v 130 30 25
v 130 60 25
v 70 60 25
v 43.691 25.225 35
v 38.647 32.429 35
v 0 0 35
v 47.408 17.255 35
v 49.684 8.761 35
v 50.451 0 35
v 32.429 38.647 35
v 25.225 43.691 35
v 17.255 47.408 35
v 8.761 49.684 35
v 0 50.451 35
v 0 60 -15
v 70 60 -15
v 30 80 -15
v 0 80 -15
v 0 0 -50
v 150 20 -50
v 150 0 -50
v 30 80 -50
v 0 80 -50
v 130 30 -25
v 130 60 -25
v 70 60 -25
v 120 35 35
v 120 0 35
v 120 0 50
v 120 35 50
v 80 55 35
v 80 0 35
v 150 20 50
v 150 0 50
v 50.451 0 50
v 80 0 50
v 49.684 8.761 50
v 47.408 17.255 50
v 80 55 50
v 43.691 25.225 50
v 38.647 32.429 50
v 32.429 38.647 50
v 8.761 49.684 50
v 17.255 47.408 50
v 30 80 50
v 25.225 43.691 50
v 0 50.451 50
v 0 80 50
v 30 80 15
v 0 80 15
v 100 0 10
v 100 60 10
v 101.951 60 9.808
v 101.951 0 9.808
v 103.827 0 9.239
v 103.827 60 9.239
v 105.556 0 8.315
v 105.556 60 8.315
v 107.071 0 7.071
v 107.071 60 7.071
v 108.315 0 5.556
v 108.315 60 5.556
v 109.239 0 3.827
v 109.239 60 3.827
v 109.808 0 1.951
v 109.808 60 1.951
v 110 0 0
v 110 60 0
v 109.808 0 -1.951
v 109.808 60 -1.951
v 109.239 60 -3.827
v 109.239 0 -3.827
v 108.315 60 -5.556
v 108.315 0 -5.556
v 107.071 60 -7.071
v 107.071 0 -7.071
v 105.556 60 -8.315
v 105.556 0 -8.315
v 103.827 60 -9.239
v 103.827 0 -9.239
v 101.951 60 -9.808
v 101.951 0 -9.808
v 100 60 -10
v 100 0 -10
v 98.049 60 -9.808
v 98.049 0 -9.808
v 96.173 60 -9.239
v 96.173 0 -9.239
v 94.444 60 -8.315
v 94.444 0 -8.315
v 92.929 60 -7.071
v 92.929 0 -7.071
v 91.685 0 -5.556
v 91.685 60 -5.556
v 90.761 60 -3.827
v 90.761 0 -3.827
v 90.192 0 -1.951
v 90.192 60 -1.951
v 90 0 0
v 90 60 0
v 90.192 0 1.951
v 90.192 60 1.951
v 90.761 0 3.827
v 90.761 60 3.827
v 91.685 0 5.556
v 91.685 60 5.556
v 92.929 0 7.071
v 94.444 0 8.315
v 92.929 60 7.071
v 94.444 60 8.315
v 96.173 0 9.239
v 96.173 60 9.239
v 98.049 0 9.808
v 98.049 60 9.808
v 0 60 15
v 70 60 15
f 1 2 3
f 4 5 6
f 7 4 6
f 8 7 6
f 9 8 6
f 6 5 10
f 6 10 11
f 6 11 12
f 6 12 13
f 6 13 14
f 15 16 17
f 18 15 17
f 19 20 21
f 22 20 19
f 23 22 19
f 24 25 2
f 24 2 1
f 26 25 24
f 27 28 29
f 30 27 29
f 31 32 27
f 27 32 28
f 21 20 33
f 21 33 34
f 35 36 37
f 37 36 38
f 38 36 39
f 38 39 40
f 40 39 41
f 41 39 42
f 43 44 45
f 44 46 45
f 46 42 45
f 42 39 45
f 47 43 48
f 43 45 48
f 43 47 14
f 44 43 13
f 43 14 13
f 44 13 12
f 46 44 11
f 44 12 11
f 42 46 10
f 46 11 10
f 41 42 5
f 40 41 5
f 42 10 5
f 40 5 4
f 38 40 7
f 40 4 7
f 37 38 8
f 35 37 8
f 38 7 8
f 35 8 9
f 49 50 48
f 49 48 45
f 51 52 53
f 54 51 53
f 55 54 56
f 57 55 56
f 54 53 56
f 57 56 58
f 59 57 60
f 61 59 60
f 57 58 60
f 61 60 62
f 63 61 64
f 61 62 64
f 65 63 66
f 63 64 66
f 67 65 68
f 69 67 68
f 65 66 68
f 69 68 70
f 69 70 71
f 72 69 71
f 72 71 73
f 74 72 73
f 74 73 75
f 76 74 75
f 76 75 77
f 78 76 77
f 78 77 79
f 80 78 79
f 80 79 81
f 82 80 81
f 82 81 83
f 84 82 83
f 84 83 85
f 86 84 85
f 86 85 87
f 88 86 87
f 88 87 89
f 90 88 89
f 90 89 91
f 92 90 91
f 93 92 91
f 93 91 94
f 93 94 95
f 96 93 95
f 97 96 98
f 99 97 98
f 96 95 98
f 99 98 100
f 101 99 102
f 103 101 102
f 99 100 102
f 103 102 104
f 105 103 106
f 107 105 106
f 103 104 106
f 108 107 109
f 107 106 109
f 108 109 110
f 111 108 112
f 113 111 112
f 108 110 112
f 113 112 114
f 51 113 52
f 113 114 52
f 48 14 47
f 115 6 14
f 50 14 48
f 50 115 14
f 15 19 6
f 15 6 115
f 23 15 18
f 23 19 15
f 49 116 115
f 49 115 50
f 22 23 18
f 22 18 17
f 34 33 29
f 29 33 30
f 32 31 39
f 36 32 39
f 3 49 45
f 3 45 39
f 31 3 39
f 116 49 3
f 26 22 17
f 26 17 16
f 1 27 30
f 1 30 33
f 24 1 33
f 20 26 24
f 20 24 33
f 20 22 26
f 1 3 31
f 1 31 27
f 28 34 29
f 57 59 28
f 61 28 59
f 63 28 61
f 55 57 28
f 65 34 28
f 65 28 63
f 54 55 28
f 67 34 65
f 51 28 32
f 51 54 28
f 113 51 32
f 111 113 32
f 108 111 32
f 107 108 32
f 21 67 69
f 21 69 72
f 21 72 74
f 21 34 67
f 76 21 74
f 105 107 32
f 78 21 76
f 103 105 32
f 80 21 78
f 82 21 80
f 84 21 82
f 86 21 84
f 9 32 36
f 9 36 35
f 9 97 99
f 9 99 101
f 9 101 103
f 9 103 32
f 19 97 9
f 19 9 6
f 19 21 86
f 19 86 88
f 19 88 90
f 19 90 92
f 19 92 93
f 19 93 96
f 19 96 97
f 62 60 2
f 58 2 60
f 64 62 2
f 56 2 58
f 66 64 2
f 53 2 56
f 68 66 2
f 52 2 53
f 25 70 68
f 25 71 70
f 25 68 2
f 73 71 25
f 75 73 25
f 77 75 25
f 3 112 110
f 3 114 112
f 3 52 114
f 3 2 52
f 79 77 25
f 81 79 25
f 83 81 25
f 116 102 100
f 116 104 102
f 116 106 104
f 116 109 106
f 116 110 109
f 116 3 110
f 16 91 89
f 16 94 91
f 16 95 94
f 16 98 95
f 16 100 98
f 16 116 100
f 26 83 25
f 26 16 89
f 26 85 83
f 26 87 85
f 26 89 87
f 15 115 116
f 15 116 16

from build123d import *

# Parameters (mm, degrees)
BOSS_EXTRUDE1_DEPTH      = 50
BOSS_EXTRUDE1_DEPTH_BACK = 50
CUT_EXTRUDE2_DEPTH       = 198.230829233
CUT_EXTRUDE2_DEPTH_BACK  = 15
BOSS_EXTRUDE2_DEPTH      = 25
BOSS_EXTRUDE2_DEPTH_BACK = 25
SKETCH8_R                = 10
CUT_EXTRUDE3_DEPTH       = 170.115345253
CUT_EXTRUDE5_REACH       = 179.2
SKETCH11_W               = 30
SKETCH11_H               = 20
CUT_EXTRUDE8_REACH       = 179.2
SKETCH14_W               = 40
SKETCH14_H               = 15


with BuildPart() as part:
    # Sketch1 → Boss-Extrude1 (new, two sides: drawn at the far end of the back side and taken through both)
    with BuildSketch(Plane.XY.offset(-BOSS_EXTRUDE1_DEPTH_BACK)):
        Polygon((0, 0), (0, 80), (30, 80), (150, 20), (150, 0), align=None)
    extrude(amount=BOSS_EXTRUDE1_DEPTH + BOSS_EXTRUDE1_DEPTH_BACK)

    # Sketch6 → Cut-Extrude2 (cut, two sides: drawn at the far end of the back side and taken through both)
    with BuildSketch(Plane.XY.offset(50).offset(-CUT_EXTRUDE2_DEPTH_BACK)):
        with BuildLine():
            Line((-326.513861399, 50.45053136), (0, 50.45053136))
            ThreePointArc((0, 50.45053136), (35.673912839, 35.673912839), (50.45053136, 0))
            Line((50.45053136, 0), (50.45053136, -326.513861399))
            Line((50.45053136, -326.513861399), (-411.309799734, -788.274192493))
            Line((-411.309799734, -788.274192493), (-788.274192493, -411.309799734))
            Line((-788.274192493, -411.309799734), (-326.513861399, 50.45053136))
        make_face()
    extrude(amount=CUT_EXTRUDE2_DEPTH + CUT_EXTRUDE2_DEPTH_BACK, mode=Mode.SUBTRACT)

    # Sketch7 → Boss-Extrude2 (add, two sides: drawn at the far end of the back side and taken through both)
    with BuildSketch(Plane.XY.offset(-BOSS_EXTRUDE2_DEPTH_BACK)):
        Polygon((70, 60), (130, 60), (130, 30), align=None)
    extrude(amount=BOSS_EXTRUDE2_DEPTH + BOSS_EXTRUDE2_DEPTH_BACK)

    # Sketch8 → Cut-Extrude3 (cut, through all)
    with BuildSketch(Plane(origin=(0, 60, 0), x_dir=(1, 0, 0), z_dir=(0, 1, 0))):
        with Locations(Location((100, 0, 0), (0, 0, 270))):
            Circle(SKETCH8_R)
    extrude(amount=-CUT_EXTRUDE3_DEPTH, mode=Mode.SUBTRACT)

    # Cut-Extrude5: up to this plane
    cut_extrude5_end = Plane(origin=(30, 80, 50), z_dir=(-0.447213595499958, -0.894427190999916, 0))
    # Sketch11 → Cut-Extrude5 (cut, up to the surface)
    with BuildSketch(Plane(origin=(0, 0, 0), x_dir=(0, 0, -1), z_dir=(1, 0, 0)), mode=Mode.PRIVATE) as cut_extrude5_sk1:
        with Locations((0, 70)):
            Rectangle(SKETCH11_W, SKETCH11_H)
    cut_extrude5_tool1 = split(extrude(cut_extrude5_sk1.sketch, amount=CUT_EXTRUDE5_REACH, mode=Mode.PRIVATE), bisect_by=cut_extrude5_end, keep=Keep.BOTH, mode=Mode.PRIVATE)
    add(cut_extrude5_tool1.solids().sort_by_distance((0, 70, 0))[0], mode=Mode.SUBTRACT)

    # Cut-Extrude8: up to this plane
    cut_extrude8_end = Plane(origin=(30, 80, 50), z_dir=(-0.447213595499958, -0.894427190999916, 0))
    # Sketch14 → Cut-Extrude8 (cut, up to the surface)
    with BuildSketch(Plane.XZ, mode=Mode.PRIVATE) as cut_extrude8_sk1:
        with Locations((100, 42.5)):
            Rectangle(SKETCH14_W, SKETCH14_H)
    cut_extrude8_tool1 = split(extrude(cut_extrude8_sk1.sketch, amount=-CUT_EXTRUDE8_REACH, mode=Mode.PRIVATE), bisect_by=cut_extrude8_end, keep=Keep.BOTH, mode=Mode.PRIVATE)
    add(cut_extrude8_tool1.solids().sort_by_distance((100, 0, 42.5))[0], mode=Mode.SUBTRACT)


solid = part.part
